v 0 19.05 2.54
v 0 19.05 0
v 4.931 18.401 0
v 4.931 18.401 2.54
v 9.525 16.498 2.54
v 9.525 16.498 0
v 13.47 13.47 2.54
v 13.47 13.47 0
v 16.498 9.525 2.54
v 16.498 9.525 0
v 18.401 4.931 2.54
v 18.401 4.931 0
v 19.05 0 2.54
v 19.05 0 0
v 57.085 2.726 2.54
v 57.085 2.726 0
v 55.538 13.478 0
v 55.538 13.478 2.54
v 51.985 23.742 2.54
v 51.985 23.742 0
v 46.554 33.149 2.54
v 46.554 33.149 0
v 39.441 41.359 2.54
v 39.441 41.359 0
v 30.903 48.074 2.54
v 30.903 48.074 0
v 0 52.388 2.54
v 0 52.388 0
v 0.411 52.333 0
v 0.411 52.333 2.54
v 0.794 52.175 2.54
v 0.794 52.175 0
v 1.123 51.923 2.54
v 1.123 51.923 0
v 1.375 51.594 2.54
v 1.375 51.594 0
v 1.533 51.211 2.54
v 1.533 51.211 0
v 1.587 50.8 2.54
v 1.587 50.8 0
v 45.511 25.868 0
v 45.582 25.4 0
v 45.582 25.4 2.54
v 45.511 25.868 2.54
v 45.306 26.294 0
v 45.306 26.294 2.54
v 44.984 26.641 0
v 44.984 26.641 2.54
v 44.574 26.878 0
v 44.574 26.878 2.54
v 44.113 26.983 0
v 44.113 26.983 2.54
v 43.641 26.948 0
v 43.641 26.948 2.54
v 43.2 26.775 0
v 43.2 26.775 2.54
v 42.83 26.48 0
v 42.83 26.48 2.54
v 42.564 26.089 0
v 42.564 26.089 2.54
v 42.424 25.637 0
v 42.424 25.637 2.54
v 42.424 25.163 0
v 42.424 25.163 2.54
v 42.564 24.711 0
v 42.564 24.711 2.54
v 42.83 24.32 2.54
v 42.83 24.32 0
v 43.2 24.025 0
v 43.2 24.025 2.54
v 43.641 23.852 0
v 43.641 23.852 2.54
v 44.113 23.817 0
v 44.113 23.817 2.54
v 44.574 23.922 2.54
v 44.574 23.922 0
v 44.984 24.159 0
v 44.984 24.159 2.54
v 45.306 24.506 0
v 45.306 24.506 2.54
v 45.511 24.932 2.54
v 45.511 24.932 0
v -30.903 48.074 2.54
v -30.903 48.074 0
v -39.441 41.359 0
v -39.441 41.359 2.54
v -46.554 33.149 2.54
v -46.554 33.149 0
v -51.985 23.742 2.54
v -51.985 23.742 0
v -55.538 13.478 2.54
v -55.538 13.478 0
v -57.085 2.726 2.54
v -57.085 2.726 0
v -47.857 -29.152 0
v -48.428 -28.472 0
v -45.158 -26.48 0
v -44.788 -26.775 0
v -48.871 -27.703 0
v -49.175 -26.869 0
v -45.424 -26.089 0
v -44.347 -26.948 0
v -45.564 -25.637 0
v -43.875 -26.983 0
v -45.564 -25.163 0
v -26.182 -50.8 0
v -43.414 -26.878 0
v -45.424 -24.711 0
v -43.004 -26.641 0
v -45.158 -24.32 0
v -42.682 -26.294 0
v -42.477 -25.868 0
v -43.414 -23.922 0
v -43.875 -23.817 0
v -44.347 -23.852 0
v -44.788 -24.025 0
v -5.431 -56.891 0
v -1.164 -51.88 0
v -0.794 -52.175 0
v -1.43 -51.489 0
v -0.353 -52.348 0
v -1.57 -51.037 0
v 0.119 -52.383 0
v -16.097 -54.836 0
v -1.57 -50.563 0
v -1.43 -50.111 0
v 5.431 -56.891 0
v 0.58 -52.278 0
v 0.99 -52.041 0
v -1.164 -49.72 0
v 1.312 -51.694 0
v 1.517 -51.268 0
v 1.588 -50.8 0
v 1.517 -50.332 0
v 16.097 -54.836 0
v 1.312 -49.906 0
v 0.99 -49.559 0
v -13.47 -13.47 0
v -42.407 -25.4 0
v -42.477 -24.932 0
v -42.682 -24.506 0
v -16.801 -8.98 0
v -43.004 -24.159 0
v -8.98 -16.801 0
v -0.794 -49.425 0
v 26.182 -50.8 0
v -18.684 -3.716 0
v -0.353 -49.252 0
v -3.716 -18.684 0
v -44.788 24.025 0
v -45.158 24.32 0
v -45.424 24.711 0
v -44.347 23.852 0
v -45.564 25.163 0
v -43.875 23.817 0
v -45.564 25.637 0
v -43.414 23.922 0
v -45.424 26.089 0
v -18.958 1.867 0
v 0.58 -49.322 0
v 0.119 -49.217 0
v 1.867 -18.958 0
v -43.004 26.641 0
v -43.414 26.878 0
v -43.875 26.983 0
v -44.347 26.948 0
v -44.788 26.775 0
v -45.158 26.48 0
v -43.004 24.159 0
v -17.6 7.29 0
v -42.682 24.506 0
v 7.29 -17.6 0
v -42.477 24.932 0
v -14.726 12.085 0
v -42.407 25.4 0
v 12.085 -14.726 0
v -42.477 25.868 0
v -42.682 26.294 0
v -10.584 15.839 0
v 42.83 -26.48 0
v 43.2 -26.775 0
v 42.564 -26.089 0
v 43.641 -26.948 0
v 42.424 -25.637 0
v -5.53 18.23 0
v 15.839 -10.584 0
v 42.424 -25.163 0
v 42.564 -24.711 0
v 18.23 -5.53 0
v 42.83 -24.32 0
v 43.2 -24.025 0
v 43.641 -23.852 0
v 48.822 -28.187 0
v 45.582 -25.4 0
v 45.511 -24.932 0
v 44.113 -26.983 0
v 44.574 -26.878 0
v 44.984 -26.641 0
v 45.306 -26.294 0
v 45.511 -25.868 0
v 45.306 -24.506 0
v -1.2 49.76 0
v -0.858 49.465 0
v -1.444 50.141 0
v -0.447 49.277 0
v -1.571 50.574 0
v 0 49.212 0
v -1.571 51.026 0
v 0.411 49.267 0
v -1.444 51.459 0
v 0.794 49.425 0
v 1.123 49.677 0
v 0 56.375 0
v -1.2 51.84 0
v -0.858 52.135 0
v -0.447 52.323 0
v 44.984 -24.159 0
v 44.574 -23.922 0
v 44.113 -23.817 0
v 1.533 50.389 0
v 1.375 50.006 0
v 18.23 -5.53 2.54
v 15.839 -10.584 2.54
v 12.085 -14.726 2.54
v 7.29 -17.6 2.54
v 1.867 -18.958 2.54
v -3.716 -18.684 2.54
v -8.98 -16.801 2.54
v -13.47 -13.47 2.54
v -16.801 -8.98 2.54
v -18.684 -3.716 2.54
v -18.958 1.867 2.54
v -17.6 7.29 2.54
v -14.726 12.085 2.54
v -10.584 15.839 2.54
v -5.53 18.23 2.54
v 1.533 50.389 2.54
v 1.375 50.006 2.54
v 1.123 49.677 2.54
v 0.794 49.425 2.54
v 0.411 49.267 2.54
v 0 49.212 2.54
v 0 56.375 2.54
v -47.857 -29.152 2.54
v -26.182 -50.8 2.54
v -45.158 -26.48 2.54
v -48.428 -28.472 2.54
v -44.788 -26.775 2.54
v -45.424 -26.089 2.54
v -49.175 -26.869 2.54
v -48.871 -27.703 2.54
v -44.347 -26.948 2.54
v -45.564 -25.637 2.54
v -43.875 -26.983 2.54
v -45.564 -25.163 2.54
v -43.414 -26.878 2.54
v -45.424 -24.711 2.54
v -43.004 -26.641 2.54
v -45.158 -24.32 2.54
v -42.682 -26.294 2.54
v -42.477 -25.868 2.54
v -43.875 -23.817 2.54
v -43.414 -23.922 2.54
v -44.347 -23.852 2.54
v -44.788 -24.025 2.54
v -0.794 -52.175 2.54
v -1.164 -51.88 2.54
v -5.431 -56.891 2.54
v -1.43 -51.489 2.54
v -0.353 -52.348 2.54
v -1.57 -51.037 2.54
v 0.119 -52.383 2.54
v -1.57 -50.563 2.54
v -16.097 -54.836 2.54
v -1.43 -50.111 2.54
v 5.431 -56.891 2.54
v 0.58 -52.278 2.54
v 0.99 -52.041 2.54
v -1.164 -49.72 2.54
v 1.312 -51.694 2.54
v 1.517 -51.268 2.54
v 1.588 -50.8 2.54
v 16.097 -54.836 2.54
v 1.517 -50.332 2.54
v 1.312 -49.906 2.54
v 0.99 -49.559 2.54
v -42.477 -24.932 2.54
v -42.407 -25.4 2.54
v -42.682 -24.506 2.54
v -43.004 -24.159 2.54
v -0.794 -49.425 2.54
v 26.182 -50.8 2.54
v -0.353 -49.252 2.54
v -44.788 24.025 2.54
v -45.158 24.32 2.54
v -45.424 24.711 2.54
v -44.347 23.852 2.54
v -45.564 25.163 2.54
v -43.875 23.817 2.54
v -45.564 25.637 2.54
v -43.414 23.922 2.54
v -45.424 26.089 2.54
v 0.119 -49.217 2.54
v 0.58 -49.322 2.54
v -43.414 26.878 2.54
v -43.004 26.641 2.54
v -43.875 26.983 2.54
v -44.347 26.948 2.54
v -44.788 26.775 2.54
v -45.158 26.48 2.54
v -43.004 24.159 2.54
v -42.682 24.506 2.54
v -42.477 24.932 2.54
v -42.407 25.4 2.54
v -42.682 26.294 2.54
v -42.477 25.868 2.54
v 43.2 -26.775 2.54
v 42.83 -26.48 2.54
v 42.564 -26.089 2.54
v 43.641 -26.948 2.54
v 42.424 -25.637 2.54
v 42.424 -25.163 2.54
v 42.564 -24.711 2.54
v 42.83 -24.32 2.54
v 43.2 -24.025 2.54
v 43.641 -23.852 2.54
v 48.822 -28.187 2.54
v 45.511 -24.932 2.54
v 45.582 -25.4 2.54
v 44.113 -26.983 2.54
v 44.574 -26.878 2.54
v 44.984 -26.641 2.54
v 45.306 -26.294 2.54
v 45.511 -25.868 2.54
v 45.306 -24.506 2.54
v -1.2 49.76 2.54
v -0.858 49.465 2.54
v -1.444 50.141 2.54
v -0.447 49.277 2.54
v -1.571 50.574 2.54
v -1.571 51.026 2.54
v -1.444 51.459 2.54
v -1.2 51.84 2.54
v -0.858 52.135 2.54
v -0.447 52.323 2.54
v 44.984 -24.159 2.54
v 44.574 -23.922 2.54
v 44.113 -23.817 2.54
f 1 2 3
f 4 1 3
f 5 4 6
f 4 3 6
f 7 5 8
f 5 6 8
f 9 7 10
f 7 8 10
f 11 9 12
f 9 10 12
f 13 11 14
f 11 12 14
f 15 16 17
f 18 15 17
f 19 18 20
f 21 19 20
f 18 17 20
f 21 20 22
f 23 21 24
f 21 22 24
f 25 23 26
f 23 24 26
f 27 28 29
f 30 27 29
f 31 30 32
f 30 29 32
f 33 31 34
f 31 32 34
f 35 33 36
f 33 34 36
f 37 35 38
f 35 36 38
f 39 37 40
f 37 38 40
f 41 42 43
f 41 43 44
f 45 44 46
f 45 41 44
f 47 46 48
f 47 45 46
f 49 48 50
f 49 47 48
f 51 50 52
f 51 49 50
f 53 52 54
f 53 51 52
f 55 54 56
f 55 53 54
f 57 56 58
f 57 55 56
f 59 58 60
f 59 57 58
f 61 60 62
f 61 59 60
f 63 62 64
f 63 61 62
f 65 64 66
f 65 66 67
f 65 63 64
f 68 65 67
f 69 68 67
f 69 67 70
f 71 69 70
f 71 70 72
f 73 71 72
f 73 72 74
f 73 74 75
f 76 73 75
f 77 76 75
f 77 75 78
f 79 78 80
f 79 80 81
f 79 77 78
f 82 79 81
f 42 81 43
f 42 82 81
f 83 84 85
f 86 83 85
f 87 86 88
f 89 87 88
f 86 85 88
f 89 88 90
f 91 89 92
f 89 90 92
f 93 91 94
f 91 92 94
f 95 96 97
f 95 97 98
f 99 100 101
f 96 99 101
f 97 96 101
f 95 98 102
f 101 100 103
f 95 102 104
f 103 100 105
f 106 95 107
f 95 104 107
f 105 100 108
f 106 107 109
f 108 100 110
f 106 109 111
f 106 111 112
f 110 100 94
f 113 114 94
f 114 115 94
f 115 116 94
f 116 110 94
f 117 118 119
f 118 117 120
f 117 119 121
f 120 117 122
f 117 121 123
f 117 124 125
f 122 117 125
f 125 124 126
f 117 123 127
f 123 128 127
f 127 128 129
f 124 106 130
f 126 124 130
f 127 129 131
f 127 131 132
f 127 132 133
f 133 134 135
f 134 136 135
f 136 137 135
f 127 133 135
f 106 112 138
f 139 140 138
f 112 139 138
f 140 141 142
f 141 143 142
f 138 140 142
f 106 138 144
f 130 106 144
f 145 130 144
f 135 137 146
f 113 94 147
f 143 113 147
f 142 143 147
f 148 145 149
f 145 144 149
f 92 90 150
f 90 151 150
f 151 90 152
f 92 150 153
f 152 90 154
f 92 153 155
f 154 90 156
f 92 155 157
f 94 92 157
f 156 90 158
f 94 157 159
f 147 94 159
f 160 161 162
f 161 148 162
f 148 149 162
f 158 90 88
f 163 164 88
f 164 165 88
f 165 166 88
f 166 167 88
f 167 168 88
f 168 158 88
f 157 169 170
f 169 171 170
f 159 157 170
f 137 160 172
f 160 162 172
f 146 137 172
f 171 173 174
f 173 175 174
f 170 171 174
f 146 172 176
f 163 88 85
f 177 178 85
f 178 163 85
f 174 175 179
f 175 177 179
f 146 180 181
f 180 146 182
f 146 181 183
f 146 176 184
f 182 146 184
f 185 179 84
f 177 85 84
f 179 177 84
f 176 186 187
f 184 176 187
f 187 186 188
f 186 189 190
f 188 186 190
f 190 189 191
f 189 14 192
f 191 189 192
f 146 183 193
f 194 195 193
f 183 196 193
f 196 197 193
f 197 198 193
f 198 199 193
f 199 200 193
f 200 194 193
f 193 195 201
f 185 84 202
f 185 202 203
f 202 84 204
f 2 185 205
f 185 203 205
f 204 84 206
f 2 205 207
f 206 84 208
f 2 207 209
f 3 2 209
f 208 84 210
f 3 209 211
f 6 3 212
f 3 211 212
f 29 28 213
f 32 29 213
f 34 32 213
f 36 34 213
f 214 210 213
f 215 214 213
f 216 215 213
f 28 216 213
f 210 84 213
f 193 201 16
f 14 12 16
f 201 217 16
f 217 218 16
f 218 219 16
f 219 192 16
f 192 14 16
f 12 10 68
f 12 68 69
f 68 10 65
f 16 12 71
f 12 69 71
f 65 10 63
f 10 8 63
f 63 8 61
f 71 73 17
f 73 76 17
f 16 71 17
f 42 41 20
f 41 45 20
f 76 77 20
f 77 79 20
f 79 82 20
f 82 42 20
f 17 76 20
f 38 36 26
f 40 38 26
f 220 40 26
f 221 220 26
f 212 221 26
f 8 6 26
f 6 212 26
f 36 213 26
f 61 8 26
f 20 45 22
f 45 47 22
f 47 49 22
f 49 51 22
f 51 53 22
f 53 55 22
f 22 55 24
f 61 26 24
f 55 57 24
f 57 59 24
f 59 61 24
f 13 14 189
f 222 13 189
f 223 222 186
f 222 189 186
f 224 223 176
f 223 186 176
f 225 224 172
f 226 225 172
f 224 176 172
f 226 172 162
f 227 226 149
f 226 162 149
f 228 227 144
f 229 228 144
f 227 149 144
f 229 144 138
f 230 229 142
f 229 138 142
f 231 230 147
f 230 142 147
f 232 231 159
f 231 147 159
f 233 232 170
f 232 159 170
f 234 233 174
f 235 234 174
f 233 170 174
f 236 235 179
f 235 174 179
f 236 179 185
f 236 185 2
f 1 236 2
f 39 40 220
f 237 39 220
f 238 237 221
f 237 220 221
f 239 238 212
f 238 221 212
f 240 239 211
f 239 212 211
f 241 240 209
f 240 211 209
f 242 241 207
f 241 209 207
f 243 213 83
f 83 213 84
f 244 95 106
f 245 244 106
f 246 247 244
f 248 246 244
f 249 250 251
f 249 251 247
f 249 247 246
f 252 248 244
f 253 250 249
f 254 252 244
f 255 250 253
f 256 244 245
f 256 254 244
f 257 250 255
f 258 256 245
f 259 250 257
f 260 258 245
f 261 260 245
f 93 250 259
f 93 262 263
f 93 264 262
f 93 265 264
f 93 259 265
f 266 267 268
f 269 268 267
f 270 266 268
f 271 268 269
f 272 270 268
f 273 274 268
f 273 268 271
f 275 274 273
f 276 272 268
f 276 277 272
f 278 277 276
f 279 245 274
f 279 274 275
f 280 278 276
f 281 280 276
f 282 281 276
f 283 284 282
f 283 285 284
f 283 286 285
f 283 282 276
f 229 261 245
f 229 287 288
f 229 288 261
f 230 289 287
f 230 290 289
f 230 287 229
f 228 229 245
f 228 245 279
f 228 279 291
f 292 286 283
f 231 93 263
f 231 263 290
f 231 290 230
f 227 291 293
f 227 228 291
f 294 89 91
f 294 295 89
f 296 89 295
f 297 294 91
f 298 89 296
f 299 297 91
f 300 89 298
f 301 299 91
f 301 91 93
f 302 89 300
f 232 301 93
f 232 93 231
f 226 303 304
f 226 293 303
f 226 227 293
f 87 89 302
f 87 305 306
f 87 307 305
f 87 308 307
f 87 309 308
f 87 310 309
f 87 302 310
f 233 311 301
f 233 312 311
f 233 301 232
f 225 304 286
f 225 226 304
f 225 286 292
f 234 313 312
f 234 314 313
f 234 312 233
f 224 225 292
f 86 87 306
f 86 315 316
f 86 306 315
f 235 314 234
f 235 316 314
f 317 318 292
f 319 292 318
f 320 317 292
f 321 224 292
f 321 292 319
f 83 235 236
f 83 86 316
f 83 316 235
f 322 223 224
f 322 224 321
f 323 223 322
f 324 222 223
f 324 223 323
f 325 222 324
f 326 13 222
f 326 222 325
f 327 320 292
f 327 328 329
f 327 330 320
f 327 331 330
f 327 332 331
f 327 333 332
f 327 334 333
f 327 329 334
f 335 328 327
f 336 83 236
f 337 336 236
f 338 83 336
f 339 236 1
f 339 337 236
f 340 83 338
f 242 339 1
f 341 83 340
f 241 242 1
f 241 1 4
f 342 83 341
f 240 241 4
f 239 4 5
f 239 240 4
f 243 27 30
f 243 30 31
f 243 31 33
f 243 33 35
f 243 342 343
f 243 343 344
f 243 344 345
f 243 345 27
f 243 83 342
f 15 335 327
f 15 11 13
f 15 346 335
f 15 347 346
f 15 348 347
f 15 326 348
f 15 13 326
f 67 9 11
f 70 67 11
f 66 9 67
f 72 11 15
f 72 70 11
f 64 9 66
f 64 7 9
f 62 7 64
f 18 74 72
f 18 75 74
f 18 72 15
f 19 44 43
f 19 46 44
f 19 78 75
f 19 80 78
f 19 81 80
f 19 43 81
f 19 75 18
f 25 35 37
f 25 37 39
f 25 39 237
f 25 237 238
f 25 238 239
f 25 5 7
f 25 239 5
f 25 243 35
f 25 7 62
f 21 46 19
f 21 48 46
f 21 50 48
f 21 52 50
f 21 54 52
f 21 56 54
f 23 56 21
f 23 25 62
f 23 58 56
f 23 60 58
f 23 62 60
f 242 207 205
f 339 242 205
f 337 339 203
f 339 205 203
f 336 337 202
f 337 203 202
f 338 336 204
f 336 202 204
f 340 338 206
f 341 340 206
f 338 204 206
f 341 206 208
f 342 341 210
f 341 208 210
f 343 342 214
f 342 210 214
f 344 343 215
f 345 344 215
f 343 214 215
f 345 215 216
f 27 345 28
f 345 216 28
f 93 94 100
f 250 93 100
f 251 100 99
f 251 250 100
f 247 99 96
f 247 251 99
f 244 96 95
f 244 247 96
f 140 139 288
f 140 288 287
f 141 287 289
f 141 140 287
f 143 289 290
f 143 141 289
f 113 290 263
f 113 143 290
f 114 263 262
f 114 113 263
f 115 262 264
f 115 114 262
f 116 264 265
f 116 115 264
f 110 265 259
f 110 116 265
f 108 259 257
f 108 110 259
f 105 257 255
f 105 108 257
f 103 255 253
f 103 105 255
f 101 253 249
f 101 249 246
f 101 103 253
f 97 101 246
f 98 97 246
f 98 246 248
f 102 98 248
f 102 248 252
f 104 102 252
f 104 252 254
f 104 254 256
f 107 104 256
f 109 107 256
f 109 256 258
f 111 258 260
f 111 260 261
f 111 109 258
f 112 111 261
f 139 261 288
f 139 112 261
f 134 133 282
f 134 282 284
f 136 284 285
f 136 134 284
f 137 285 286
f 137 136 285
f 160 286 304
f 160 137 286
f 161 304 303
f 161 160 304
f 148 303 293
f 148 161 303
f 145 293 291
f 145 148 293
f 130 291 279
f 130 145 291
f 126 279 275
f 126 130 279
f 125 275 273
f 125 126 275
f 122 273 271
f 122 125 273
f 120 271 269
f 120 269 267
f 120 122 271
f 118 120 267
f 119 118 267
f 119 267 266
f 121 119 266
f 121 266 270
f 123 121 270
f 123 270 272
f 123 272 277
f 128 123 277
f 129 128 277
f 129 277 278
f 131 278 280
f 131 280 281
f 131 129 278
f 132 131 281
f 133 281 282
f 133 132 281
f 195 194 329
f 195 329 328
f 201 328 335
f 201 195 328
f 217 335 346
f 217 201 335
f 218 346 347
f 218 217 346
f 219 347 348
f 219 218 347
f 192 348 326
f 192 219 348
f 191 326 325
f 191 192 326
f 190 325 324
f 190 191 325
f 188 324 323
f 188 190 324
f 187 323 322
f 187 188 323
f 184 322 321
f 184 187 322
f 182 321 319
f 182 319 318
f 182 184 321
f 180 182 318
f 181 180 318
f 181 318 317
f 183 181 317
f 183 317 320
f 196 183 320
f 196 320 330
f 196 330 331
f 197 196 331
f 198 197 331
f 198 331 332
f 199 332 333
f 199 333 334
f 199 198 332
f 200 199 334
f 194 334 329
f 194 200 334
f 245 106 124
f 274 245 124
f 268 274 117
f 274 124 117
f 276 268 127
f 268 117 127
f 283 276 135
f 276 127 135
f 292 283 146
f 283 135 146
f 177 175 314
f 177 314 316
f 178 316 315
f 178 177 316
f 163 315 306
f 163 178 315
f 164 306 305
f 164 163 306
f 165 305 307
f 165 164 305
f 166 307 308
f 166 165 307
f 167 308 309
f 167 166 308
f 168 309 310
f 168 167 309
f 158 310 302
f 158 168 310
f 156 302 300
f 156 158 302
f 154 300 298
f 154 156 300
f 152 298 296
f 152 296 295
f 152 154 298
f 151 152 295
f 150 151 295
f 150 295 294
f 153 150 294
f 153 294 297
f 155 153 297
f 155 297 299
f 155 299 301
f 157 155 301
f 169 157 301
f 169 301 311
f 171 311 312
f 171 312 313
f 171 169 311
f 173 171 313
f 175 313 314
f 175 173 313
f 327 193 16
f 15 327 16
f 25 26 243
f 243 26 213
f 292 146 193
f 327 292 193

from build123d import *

# Parameters (mm, degrees)
F0_R     = 1.5875
F1_DEPTH = 2.54
F2_R     = 5.08


with BuildPart() as f1:
    # F0 (on Top) → F1 (new body)
    with BuildSketch(Plane.XY):
        with BuildLine():
            Line((30.90323, 48.074035), (0, 56.374997))
            Line((0, 56.374997), (-30.90323, 48.074035))
            ThreePointArc((-30.90323, 48.074035), (-49.493352, 28.575), (-57.084951, 2.725965))
            Line((-57.084951, 2.725965), (-48.822179, -28.187498))
            Line((-48.822179, -28.187498), (-26.181721, -50.8))
            ThreePointArc((-26.181721, -50.8), (0, -57.15), (26.181721, -50.8))
            Line((26.181721, -50.8), (48.822179, -28.187498))
            Line((48.822179, -28.187498), (57.084951, 2.725965))
            ThreePointArc((57.084951, 2.725965), (49.493352, 28.575), (30.90323, 48.074035))
        make_face()
        with Locations((-43.994091, -25.4)):
            Circle(F0_R, mode=Mode.SUBTRACT)
        with Locations((0, -50.8)):
            Circle(F0_R, mode=Mode.SUBTRACT)
        with Locations((43.994091, -25.4)):
            Circle(F0_R, mode=Mode.SUBTRACT)
        with Locations((-43.994091, 25.4)):
            Circle(F0_R, mode=Mode.SUBTRACT)
        with BuildLine():
            ThreePointArc((47.625, 0), (-33.67596, -33.67596), (0, 47.625))
            ThreePointArc((0, 47.625), (33.67596, 33.67596), (47.625, 0))
        make_face(mode=Mode.SUBTRACT)
        with Locations((43.994091, 25.4)):
            Circle(F0_R, mode=Mode.SUBTRACT)
        with BuildLine():
            ThreePointArc((1.5875, 50.8), (1.122532, 49.677468), (0, 49.2125))
            ThreePointArc((0, 49.2125), (-1.5875, 50.8), (0, 52.3875))
            ThreePointArc((0, 52.3875), (1.122532, 51.922532), (1.5875, 50.8))
        make_face(mode=Mode.SUBTRACT)
        with BuildLine():
            ThreePointArc((47.625, 0), (33.67596, 33.67596), (0, 47.625))
            ThreePointArc((0, 47.625), (-33.67596, -33.67596), (47.625, 0))
        make_face()
        with BuildLine():
            ThreePointArc((19.05, 0), (-13.470384, -13.470384), (0, 19.05))
            ThreePointArc((0, 19.05), (13.470384, 13.470384), (19.05, 0))
        make_face(mode=Mode.SUBTRACT)
    extrude(amount=F1_DEPTH)

    # F2
    f2_edges = [f1.edges().sort_by_distance(p)[0] for p in [
        (-48.822179, -28.187498, 1.27),
    ]]
    fillet(f2_edges, radius=F2_R)


solid = f1.part
